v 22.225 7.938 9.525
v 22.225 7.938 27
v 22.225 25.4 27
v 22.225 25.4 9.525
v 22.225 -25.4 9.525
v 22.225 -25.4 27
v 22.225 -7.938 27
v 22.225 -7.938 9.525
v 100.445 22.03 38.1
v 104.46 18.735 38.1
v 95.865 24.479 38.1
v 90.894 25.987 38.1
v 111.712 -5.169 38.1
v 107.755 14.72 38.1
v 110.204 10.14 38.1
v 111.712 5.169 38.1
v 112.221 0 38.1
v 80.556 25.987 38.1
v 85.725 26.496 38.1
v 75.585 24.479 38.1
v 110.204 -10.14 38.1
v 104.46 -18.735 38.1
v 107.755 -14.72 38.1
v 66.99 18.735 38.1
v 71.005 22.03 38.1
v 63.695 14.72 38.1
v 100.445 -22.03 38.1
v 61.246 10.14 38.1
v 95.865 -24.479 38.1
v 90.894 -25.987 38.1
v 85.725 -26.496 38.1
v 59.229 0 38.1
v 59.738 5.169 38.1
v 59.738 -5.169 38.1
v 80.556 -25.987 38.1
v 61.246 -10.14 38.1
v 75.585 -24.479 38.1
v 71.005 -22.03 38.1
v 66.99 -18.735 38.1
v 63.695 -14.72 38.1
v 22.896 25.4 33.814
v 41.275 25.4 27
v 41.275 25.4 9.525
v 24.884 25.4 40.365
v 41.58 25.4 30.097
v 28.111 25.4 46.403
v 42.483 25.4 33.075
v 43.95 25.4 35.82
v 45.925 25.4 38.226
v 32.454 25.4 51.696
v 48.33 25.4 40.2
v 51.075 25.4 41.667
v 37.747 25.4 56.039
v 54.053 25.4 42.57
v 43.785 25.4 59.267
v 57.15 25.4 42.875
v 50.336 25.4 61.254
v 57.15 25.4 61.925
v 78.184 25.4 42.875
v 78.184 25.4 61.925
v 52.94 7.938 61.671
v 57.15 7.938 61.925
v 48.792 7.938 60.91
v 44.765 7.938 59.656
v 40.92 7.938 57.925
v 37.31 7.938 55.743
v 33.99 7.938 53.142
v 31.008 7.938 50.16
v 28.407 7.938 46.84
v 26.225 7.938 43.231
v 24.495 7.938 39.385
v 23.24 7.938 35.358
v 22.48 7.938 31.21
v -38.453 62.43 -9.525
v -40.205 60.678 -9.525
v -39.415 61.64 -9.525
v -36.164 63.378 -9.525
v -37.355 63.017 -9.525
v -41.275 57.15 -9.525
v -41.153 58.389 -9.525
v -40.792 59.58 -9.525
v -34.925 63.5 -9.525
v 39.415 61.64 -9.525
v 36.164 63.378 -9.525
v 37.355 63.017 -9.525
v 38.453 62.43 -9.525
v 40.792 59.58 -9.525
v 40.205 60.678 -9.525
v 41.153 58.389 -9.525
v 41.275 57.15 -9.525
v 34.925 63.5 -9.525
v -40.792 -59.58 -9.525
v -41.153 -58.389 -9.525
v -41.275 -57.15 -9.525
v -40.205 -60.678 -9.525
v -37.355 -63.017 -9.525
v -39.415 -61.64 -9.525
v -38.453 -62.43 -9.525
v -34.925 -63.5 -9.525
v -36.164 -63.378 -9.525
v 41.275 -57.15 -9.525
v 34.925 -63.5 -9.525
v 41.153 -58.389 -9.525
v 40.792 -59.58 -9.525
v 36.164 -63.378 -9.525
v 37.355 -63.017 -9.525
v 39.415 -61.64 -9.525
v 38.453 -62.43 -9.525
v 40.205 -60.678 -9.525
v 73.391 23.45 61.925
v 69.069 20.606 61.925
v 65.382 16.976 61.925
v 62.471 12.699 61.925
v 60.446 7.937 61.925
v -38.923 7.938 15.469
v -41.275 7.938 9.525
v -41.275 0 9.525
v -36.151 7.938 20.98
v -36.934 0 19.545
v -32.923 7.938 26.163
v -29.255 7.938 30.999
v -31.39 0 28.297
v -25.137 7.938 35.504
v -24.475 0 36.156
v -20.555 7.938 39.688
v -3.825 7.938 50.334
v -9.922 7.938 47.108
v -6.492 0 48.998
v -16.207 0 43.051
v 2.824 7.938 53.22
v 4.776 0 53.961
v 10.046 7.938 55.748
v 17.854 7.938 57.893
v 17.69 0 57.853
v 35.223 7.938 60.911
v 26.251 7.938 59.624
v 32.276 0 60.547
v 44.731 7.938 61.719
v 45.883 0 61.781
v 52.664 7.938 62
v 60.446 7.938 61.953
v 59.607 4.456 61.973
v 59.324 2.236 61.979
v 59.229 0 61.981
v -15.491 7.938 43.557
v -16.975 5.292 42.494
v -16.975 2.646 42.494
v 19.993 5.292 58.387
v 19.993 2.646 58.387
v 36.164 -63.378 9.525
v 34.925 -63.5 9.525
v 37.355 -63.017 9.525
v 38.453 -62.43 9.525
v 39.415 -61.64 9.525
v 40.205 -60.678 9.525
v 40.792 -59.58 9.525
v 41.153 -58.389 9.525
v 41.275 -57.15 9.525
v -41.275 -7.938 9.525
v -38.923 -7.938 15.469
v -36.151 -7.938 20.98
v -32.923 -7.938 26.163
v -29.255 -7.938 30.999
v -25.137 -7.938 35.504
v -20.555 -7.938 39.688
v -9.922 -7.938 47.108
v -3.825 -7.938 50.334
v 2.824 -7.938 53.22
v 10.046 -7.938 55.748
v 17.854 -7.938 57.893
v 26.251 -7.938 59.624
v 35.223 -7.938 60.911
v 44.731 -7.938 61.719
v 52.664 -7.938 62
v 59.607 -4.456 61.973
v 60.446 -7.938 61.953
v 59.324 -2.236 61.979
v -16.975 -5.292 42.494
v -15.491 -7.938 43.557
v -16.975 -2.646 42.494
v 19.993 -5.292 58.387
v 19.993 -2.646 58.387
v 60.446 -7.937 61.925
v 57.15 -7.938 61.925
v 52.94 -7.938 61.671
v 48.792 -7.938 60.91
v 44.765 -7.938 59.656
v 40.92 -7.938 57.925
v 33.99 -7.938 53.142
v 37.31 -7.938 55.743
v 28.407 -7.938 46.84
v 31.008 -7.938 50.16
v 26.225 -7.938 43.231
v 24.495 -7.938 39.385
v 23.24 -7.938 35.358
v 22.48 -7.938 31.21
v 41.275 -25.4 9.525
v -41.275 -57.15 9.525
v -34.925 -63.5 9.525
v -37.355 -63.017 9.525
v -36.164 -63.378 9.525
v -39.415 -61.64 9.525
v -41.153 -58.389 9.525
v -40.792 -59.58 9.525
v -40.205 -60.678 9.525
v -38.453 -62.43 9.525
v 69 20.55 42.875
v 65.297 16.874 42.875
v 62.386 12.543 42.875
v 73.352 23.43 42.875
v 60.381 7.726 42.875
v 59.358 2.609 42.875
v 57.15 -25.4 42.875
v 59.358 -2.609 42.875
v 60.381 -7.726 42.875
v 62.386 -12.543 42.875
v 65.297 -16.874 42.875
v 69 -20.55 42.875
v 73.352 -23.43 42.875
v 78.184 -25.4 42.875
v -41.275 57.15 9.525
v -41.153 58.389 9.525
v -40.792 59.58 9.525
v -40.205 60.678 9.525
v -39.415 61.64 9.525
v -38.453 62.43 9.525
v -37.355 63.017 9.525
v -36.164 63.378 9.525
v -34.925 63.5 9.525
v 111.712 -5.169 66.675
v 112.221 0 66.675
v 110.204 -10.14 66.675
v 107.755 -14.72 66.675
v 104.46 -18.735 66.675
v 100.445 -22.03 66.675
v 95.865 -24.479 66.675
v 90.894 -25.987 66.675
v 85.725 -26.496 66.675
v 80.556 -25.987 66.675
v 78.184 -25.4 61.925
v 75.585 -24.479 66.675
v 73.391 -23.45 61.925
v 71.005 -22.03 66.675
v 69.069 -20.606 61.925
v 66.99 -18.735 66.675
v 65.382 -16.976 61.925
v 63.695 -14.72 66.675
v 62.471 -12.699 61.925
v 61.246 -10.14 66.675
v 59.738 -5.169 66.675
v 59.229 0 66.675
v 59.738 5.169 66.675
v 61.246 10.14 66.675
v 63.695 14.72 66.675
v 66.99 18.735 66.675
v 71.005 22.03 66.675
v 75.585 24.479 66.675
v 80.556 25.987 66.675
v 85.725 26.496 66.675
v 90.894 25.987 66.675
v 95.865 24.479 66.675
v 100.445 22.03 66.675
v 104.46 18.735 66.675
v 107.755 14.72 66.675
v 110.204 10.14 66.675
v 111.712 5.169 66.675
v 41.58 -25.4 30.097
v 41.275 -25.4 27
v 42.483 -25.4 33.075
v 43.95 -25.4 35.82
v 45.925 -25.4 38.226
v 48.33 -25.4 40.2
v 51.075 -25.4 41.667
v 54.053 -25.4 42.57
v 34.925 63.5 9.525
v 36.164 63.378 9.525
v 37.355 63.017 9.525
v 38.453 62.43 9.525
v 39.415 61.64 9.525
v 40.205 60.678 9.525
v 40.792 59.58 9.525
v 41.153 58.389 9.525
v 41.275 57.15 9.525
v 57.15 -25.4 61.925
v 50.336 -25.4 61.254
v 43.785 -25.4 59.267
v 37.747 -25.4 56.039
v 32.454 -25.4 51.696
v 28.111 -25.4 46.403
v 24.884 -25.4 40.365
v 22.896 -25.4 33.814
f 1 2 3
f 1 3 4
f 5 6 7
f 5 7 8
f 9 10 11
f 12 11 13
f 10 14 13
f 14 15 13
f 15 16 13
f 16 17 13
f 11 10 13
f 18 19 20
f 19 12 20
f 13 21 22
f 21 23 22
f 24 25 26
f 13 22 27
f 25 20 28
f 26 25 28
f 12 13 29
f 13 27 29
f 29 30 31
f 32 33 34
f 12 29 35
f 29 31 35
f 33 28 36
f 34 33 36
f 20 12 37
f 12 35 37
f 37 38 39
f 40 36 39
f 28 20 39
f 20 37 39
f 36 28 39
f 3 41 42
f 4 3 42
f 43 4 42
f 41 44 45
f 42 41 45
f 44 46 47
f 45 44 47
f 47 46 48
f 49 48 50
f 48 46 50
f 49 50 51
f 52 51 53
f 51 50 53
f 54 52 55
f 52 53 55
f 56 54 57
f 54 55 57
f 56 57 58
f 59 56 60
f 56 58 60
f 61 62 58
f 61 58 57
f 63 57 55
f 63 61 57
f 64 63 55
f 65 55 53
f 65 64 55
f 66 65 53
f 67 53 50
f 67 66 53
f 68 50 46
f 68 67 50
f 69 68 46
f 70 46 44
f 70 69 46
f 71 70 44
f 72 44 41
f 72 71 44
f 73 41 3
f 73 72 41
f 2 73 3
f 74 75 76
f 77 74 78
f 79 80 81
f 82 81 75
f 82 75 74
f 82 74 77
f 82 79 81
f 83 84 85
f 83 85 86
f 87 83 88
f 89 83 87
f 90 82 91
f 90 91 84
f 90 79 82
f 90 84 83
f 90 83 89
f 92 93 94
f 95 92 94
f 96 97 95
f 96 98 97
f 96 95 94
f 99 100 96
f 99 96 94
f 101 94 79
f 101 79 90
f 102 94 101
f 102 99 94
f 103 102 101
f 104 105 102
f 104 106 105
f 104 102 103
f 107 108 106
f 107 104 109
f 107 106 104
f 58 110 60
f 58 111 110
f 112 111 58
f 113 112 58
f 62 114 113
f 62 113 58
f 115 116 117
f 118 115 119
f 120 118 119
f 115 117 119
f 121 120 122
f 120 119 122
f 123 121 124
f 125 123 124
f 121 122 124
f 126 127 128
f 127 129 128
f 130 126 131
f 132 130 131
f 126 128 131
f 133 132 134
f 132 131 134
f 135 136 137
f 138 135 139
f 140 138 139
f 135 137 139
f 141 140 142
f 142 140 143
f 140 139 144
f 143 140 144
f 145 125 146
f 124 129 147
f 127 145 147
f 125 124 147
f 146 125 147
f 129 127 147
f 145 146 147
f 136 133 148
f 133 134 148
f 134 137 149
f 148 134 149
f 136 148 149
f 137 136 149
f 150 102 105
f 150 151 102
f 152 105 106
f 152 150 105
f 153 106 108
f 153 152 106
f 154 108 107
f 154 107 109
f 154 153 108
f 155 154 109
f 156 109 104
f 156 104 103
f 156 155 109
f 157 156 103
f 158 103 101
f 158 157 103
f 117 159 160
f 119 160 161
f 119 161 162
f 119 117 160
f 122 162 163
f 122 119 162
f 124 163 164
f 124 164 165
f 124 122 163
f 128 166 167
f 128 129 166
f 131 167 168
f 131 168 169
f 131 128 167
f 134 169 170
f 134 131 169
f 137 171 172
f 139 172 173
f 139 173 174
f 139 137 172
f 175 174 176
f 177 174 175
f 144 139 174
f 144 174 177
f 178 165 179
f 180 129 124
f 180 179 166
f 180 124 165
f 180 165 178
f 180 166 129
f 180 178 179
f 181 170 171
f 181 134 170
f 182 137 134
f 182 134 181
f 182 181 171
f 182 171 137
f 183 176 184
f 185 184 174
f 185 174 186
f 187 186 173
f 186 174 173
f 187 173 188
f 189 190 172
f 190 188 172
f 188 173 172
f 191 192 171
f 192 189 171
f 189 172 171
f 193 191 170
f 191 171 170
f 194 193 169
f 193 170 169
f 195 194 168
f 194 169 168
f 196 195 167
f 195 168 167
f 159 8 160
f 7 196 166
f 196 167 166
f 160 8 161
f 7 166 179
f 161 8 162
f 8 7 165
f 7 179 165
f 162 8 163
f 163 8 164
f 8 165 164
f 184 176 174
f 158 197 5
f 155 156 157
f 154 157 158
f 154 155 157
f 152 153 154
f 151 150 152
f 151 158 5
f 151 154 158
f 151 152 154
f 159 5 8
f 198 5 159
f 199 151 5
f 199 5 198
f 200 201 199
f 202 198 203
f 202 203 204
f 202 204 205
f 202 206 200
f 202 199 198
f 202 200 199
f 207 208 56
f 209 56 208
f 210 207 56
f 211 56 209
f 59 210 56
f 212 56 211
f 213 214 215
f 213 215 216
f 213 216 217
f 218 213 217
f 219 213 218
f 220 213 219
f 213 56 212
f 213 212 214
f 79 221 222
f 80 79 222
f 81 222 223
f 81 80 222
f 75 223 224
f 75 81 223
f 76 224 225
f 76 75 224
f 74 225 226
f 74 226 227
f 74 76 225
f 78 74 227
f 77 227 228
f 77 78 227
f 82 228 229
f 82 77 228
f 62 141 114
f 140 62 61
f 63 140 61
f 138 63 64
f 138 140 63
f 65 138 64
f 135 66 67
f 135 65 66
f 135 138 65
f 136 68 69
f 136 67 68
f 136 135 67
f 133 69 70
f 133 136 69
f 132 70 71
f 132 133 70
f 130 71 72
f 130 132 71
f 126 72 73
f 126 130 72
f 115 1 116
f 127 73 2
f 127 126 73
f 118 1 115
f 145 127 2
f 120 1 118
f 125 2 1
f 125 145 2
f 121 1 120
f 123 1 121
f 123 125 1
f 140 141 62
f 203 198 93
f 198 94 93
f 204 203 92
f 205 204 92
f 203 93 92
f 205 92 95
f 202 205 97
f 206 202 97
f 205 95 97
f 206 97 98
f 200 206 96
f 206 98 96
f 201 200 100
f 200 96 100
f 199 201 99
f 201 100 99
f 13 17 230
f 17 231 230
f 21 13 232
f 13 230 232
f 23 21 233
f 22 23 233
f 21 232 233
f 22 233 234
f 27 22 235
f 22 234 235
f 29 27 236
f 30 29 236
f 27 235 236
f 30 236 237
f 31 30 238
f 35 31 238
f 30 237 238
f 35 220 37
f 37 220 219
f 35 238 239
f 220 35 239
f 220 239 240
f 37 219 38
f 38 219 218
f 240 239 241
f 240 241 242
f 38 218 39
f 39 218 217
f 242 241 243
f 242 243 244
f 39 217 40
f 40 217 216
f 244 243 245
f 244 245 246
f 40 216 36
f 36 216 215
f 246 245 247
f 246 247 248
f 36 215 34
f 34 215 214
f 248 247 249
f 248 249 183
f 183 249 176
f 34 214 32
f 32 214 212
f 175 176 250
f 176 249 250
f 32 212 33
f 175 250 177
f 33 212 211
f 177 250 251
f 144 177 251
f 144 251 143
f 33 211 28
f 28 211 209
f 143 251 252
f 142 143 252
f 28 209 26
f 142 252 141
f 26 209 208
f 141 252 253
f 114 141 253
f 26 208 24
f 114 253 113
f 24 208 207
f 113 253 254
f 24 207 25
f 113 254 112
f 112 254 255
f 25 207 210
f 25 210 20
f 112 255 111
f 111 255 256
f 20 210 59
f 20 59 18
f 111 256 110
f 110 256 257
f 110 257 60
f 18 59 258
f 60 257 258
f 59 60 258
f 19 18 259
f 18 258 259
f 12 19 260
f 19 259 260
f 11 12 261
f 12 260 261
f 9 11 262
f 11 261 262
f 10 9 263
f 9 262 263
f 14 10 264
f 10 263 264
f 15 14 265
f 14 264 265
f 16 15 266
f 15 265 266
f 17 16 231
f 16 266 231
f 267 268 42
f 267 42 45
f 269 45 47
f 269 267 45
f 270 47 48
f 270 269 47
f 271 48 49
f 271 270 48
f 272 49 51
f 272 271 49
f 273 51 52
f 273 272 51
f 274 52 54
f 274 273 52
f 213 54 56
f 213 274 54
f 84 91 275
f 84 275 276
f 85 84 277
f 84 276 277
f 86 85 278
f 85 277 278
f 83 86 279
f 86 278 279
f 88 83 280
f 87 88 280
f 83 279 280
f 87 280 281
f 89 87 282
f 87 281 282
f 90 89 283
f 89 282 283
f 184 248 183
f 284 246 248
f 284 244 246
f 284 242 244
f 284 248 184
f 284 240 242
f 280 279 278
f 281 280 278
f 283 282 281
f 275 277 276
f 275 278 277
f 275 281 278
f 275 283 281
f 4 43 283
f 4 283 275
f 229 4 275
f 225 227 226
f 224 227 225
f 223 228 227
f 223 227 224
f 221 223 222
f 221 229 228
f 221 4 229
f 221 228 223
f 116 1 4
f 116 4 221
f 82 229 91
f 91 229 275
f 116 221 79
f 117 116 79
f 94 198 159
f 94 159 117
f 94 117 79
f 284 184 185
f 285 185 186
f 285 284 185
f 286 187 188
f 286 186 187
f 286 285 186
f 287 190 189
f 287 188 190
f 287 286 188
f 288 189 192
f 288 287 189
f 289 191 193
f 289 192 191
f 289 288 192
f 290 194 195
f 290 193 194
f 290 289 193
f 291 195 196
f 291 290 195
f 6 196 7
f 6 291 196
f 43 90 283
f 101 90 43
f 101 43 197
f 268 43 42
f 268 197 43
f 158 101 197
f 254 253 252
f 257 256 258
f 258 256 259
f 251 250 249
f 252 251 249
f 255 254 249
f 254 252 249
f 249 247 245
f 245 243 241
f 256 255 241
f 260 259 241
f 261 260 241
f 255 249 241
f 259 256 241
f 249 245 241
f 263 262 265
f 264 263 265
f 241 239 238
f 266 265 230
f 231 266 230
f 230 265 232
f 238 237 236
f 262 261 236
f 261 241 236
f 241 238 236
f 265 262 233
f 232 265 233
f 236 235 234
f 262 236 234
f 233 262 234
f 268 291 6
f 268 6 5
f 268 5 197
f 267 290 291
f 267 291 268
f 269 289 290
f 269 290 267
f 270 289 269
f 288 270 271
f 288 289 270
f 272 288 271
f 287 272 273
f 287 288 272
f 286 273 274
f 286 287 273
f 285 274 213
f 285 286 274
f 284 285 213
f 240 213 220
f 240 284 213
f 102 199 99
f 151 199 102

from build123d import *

# Parameters (mm, degrees)
F1_DEPTH = 63.5
F2_DEPTH = 25.4
F0_W     = 24.304205
F0_H     = 19.05
F3_DEPTH = 25.4
F5_DEPTH = 7.9375
F6_R     = 6.35


with BuildPart() as f1:
    # F0 (on Front) → F1 (new body, symmetric)
    with BuildSketch(Plane.XZ):
        Polygon((-41.275, 9.525), (-41.275, -9.525), (41.275, -9.525), (41.275, 9.525), (22.225, 9.525), align=None)
    extrude(amount=F1_DEPTH, both=True)

    # F0 (on Front) → F2 (join, symmetric)
    with BuildSketch(Plane.XZ):
        with BuildLine():
            Line((22.225, 9.525), (41.275, 9.525))
            Line((41.275, 9.525), (41.275, 27.0002))
            ThreePointArc((41.275, 27.0002), (45.92468, 38.22552), (57.15, 42.8752))
            Line((57.15, 42.8752), (61.420795, 42.8752))
            Line((61.420795, 42.8752), (61.420795, 61.9252))
            Line((61.420795, 61.9252), (57.15, 61.9252))
            ThreePointArc((57.15, 61.9252), (32.454296, 51.695904), (22.225, 27.0002))
            Line((22.225, 27.0002), (22.225, 9.525))
        make_face()
    extrude(amount=F2_DEPTH, both=True)

    # F0 (on Front) → F3 (join, symmetric)
    with BuildSketch(Plane.XZ):
        with Locations((73.572897, 52.4002)):
            Rectangle(F0_W, F0_H)
    extrude(amount=F3_DEPTH, both=True)

    # F0 (on Front) → F4 (revolve)
    with BuildSketch(Plane.XZ):
        Polygon((85.725, 66.675), (85.725, 61.9252), (85.725, 42.8752), (85.725, 38.1), (112.220795, 38.1), (112.220795, 66.675), align=None)
    revolve(axis=Axis((85.725, 0, 54.7751), (0, 0, -1)))

    # F0 (on Front) → F5 (join, symmetric)
    with BuildSketch(Plane.XZ):
        with BuildLine():
            add(Edge.make_bspline(
                [(-41.275, 9.525), (-26.246125, 52.973336), (22.107758, 63.136719), (61.420795, 61.9252)],
                knots=[0, 0, 0, 0, 115.291835, 115.291835, 115.291835, 115.291835], degree=3))
            Line((-41.275, 9.525), (22.225, 9.525))
            Line((22.225, 9.525), (22.225, 27.0002))
            ThreePointArc((22.225, 27.0002), (32.454296, 51.695904), (57.15, 61.9252))
            Line((57.15, 61.9252), (61.420795, 61.9252))
        make_face()
    extrude(amount=F5_DEPTH, both=True)

    # F6
    f6_edges = [f1.edges().sort_by_distance(p)[0] for p in [
        (41.275, 63.5, 0),
        (-41.275, 63.5, 0),
        (-41.275, -63.5, 0),
        (41.275, -63.5, 0),
    ]]
    fillet(f6_edges, radius=F6_R)


solid = f1.part
